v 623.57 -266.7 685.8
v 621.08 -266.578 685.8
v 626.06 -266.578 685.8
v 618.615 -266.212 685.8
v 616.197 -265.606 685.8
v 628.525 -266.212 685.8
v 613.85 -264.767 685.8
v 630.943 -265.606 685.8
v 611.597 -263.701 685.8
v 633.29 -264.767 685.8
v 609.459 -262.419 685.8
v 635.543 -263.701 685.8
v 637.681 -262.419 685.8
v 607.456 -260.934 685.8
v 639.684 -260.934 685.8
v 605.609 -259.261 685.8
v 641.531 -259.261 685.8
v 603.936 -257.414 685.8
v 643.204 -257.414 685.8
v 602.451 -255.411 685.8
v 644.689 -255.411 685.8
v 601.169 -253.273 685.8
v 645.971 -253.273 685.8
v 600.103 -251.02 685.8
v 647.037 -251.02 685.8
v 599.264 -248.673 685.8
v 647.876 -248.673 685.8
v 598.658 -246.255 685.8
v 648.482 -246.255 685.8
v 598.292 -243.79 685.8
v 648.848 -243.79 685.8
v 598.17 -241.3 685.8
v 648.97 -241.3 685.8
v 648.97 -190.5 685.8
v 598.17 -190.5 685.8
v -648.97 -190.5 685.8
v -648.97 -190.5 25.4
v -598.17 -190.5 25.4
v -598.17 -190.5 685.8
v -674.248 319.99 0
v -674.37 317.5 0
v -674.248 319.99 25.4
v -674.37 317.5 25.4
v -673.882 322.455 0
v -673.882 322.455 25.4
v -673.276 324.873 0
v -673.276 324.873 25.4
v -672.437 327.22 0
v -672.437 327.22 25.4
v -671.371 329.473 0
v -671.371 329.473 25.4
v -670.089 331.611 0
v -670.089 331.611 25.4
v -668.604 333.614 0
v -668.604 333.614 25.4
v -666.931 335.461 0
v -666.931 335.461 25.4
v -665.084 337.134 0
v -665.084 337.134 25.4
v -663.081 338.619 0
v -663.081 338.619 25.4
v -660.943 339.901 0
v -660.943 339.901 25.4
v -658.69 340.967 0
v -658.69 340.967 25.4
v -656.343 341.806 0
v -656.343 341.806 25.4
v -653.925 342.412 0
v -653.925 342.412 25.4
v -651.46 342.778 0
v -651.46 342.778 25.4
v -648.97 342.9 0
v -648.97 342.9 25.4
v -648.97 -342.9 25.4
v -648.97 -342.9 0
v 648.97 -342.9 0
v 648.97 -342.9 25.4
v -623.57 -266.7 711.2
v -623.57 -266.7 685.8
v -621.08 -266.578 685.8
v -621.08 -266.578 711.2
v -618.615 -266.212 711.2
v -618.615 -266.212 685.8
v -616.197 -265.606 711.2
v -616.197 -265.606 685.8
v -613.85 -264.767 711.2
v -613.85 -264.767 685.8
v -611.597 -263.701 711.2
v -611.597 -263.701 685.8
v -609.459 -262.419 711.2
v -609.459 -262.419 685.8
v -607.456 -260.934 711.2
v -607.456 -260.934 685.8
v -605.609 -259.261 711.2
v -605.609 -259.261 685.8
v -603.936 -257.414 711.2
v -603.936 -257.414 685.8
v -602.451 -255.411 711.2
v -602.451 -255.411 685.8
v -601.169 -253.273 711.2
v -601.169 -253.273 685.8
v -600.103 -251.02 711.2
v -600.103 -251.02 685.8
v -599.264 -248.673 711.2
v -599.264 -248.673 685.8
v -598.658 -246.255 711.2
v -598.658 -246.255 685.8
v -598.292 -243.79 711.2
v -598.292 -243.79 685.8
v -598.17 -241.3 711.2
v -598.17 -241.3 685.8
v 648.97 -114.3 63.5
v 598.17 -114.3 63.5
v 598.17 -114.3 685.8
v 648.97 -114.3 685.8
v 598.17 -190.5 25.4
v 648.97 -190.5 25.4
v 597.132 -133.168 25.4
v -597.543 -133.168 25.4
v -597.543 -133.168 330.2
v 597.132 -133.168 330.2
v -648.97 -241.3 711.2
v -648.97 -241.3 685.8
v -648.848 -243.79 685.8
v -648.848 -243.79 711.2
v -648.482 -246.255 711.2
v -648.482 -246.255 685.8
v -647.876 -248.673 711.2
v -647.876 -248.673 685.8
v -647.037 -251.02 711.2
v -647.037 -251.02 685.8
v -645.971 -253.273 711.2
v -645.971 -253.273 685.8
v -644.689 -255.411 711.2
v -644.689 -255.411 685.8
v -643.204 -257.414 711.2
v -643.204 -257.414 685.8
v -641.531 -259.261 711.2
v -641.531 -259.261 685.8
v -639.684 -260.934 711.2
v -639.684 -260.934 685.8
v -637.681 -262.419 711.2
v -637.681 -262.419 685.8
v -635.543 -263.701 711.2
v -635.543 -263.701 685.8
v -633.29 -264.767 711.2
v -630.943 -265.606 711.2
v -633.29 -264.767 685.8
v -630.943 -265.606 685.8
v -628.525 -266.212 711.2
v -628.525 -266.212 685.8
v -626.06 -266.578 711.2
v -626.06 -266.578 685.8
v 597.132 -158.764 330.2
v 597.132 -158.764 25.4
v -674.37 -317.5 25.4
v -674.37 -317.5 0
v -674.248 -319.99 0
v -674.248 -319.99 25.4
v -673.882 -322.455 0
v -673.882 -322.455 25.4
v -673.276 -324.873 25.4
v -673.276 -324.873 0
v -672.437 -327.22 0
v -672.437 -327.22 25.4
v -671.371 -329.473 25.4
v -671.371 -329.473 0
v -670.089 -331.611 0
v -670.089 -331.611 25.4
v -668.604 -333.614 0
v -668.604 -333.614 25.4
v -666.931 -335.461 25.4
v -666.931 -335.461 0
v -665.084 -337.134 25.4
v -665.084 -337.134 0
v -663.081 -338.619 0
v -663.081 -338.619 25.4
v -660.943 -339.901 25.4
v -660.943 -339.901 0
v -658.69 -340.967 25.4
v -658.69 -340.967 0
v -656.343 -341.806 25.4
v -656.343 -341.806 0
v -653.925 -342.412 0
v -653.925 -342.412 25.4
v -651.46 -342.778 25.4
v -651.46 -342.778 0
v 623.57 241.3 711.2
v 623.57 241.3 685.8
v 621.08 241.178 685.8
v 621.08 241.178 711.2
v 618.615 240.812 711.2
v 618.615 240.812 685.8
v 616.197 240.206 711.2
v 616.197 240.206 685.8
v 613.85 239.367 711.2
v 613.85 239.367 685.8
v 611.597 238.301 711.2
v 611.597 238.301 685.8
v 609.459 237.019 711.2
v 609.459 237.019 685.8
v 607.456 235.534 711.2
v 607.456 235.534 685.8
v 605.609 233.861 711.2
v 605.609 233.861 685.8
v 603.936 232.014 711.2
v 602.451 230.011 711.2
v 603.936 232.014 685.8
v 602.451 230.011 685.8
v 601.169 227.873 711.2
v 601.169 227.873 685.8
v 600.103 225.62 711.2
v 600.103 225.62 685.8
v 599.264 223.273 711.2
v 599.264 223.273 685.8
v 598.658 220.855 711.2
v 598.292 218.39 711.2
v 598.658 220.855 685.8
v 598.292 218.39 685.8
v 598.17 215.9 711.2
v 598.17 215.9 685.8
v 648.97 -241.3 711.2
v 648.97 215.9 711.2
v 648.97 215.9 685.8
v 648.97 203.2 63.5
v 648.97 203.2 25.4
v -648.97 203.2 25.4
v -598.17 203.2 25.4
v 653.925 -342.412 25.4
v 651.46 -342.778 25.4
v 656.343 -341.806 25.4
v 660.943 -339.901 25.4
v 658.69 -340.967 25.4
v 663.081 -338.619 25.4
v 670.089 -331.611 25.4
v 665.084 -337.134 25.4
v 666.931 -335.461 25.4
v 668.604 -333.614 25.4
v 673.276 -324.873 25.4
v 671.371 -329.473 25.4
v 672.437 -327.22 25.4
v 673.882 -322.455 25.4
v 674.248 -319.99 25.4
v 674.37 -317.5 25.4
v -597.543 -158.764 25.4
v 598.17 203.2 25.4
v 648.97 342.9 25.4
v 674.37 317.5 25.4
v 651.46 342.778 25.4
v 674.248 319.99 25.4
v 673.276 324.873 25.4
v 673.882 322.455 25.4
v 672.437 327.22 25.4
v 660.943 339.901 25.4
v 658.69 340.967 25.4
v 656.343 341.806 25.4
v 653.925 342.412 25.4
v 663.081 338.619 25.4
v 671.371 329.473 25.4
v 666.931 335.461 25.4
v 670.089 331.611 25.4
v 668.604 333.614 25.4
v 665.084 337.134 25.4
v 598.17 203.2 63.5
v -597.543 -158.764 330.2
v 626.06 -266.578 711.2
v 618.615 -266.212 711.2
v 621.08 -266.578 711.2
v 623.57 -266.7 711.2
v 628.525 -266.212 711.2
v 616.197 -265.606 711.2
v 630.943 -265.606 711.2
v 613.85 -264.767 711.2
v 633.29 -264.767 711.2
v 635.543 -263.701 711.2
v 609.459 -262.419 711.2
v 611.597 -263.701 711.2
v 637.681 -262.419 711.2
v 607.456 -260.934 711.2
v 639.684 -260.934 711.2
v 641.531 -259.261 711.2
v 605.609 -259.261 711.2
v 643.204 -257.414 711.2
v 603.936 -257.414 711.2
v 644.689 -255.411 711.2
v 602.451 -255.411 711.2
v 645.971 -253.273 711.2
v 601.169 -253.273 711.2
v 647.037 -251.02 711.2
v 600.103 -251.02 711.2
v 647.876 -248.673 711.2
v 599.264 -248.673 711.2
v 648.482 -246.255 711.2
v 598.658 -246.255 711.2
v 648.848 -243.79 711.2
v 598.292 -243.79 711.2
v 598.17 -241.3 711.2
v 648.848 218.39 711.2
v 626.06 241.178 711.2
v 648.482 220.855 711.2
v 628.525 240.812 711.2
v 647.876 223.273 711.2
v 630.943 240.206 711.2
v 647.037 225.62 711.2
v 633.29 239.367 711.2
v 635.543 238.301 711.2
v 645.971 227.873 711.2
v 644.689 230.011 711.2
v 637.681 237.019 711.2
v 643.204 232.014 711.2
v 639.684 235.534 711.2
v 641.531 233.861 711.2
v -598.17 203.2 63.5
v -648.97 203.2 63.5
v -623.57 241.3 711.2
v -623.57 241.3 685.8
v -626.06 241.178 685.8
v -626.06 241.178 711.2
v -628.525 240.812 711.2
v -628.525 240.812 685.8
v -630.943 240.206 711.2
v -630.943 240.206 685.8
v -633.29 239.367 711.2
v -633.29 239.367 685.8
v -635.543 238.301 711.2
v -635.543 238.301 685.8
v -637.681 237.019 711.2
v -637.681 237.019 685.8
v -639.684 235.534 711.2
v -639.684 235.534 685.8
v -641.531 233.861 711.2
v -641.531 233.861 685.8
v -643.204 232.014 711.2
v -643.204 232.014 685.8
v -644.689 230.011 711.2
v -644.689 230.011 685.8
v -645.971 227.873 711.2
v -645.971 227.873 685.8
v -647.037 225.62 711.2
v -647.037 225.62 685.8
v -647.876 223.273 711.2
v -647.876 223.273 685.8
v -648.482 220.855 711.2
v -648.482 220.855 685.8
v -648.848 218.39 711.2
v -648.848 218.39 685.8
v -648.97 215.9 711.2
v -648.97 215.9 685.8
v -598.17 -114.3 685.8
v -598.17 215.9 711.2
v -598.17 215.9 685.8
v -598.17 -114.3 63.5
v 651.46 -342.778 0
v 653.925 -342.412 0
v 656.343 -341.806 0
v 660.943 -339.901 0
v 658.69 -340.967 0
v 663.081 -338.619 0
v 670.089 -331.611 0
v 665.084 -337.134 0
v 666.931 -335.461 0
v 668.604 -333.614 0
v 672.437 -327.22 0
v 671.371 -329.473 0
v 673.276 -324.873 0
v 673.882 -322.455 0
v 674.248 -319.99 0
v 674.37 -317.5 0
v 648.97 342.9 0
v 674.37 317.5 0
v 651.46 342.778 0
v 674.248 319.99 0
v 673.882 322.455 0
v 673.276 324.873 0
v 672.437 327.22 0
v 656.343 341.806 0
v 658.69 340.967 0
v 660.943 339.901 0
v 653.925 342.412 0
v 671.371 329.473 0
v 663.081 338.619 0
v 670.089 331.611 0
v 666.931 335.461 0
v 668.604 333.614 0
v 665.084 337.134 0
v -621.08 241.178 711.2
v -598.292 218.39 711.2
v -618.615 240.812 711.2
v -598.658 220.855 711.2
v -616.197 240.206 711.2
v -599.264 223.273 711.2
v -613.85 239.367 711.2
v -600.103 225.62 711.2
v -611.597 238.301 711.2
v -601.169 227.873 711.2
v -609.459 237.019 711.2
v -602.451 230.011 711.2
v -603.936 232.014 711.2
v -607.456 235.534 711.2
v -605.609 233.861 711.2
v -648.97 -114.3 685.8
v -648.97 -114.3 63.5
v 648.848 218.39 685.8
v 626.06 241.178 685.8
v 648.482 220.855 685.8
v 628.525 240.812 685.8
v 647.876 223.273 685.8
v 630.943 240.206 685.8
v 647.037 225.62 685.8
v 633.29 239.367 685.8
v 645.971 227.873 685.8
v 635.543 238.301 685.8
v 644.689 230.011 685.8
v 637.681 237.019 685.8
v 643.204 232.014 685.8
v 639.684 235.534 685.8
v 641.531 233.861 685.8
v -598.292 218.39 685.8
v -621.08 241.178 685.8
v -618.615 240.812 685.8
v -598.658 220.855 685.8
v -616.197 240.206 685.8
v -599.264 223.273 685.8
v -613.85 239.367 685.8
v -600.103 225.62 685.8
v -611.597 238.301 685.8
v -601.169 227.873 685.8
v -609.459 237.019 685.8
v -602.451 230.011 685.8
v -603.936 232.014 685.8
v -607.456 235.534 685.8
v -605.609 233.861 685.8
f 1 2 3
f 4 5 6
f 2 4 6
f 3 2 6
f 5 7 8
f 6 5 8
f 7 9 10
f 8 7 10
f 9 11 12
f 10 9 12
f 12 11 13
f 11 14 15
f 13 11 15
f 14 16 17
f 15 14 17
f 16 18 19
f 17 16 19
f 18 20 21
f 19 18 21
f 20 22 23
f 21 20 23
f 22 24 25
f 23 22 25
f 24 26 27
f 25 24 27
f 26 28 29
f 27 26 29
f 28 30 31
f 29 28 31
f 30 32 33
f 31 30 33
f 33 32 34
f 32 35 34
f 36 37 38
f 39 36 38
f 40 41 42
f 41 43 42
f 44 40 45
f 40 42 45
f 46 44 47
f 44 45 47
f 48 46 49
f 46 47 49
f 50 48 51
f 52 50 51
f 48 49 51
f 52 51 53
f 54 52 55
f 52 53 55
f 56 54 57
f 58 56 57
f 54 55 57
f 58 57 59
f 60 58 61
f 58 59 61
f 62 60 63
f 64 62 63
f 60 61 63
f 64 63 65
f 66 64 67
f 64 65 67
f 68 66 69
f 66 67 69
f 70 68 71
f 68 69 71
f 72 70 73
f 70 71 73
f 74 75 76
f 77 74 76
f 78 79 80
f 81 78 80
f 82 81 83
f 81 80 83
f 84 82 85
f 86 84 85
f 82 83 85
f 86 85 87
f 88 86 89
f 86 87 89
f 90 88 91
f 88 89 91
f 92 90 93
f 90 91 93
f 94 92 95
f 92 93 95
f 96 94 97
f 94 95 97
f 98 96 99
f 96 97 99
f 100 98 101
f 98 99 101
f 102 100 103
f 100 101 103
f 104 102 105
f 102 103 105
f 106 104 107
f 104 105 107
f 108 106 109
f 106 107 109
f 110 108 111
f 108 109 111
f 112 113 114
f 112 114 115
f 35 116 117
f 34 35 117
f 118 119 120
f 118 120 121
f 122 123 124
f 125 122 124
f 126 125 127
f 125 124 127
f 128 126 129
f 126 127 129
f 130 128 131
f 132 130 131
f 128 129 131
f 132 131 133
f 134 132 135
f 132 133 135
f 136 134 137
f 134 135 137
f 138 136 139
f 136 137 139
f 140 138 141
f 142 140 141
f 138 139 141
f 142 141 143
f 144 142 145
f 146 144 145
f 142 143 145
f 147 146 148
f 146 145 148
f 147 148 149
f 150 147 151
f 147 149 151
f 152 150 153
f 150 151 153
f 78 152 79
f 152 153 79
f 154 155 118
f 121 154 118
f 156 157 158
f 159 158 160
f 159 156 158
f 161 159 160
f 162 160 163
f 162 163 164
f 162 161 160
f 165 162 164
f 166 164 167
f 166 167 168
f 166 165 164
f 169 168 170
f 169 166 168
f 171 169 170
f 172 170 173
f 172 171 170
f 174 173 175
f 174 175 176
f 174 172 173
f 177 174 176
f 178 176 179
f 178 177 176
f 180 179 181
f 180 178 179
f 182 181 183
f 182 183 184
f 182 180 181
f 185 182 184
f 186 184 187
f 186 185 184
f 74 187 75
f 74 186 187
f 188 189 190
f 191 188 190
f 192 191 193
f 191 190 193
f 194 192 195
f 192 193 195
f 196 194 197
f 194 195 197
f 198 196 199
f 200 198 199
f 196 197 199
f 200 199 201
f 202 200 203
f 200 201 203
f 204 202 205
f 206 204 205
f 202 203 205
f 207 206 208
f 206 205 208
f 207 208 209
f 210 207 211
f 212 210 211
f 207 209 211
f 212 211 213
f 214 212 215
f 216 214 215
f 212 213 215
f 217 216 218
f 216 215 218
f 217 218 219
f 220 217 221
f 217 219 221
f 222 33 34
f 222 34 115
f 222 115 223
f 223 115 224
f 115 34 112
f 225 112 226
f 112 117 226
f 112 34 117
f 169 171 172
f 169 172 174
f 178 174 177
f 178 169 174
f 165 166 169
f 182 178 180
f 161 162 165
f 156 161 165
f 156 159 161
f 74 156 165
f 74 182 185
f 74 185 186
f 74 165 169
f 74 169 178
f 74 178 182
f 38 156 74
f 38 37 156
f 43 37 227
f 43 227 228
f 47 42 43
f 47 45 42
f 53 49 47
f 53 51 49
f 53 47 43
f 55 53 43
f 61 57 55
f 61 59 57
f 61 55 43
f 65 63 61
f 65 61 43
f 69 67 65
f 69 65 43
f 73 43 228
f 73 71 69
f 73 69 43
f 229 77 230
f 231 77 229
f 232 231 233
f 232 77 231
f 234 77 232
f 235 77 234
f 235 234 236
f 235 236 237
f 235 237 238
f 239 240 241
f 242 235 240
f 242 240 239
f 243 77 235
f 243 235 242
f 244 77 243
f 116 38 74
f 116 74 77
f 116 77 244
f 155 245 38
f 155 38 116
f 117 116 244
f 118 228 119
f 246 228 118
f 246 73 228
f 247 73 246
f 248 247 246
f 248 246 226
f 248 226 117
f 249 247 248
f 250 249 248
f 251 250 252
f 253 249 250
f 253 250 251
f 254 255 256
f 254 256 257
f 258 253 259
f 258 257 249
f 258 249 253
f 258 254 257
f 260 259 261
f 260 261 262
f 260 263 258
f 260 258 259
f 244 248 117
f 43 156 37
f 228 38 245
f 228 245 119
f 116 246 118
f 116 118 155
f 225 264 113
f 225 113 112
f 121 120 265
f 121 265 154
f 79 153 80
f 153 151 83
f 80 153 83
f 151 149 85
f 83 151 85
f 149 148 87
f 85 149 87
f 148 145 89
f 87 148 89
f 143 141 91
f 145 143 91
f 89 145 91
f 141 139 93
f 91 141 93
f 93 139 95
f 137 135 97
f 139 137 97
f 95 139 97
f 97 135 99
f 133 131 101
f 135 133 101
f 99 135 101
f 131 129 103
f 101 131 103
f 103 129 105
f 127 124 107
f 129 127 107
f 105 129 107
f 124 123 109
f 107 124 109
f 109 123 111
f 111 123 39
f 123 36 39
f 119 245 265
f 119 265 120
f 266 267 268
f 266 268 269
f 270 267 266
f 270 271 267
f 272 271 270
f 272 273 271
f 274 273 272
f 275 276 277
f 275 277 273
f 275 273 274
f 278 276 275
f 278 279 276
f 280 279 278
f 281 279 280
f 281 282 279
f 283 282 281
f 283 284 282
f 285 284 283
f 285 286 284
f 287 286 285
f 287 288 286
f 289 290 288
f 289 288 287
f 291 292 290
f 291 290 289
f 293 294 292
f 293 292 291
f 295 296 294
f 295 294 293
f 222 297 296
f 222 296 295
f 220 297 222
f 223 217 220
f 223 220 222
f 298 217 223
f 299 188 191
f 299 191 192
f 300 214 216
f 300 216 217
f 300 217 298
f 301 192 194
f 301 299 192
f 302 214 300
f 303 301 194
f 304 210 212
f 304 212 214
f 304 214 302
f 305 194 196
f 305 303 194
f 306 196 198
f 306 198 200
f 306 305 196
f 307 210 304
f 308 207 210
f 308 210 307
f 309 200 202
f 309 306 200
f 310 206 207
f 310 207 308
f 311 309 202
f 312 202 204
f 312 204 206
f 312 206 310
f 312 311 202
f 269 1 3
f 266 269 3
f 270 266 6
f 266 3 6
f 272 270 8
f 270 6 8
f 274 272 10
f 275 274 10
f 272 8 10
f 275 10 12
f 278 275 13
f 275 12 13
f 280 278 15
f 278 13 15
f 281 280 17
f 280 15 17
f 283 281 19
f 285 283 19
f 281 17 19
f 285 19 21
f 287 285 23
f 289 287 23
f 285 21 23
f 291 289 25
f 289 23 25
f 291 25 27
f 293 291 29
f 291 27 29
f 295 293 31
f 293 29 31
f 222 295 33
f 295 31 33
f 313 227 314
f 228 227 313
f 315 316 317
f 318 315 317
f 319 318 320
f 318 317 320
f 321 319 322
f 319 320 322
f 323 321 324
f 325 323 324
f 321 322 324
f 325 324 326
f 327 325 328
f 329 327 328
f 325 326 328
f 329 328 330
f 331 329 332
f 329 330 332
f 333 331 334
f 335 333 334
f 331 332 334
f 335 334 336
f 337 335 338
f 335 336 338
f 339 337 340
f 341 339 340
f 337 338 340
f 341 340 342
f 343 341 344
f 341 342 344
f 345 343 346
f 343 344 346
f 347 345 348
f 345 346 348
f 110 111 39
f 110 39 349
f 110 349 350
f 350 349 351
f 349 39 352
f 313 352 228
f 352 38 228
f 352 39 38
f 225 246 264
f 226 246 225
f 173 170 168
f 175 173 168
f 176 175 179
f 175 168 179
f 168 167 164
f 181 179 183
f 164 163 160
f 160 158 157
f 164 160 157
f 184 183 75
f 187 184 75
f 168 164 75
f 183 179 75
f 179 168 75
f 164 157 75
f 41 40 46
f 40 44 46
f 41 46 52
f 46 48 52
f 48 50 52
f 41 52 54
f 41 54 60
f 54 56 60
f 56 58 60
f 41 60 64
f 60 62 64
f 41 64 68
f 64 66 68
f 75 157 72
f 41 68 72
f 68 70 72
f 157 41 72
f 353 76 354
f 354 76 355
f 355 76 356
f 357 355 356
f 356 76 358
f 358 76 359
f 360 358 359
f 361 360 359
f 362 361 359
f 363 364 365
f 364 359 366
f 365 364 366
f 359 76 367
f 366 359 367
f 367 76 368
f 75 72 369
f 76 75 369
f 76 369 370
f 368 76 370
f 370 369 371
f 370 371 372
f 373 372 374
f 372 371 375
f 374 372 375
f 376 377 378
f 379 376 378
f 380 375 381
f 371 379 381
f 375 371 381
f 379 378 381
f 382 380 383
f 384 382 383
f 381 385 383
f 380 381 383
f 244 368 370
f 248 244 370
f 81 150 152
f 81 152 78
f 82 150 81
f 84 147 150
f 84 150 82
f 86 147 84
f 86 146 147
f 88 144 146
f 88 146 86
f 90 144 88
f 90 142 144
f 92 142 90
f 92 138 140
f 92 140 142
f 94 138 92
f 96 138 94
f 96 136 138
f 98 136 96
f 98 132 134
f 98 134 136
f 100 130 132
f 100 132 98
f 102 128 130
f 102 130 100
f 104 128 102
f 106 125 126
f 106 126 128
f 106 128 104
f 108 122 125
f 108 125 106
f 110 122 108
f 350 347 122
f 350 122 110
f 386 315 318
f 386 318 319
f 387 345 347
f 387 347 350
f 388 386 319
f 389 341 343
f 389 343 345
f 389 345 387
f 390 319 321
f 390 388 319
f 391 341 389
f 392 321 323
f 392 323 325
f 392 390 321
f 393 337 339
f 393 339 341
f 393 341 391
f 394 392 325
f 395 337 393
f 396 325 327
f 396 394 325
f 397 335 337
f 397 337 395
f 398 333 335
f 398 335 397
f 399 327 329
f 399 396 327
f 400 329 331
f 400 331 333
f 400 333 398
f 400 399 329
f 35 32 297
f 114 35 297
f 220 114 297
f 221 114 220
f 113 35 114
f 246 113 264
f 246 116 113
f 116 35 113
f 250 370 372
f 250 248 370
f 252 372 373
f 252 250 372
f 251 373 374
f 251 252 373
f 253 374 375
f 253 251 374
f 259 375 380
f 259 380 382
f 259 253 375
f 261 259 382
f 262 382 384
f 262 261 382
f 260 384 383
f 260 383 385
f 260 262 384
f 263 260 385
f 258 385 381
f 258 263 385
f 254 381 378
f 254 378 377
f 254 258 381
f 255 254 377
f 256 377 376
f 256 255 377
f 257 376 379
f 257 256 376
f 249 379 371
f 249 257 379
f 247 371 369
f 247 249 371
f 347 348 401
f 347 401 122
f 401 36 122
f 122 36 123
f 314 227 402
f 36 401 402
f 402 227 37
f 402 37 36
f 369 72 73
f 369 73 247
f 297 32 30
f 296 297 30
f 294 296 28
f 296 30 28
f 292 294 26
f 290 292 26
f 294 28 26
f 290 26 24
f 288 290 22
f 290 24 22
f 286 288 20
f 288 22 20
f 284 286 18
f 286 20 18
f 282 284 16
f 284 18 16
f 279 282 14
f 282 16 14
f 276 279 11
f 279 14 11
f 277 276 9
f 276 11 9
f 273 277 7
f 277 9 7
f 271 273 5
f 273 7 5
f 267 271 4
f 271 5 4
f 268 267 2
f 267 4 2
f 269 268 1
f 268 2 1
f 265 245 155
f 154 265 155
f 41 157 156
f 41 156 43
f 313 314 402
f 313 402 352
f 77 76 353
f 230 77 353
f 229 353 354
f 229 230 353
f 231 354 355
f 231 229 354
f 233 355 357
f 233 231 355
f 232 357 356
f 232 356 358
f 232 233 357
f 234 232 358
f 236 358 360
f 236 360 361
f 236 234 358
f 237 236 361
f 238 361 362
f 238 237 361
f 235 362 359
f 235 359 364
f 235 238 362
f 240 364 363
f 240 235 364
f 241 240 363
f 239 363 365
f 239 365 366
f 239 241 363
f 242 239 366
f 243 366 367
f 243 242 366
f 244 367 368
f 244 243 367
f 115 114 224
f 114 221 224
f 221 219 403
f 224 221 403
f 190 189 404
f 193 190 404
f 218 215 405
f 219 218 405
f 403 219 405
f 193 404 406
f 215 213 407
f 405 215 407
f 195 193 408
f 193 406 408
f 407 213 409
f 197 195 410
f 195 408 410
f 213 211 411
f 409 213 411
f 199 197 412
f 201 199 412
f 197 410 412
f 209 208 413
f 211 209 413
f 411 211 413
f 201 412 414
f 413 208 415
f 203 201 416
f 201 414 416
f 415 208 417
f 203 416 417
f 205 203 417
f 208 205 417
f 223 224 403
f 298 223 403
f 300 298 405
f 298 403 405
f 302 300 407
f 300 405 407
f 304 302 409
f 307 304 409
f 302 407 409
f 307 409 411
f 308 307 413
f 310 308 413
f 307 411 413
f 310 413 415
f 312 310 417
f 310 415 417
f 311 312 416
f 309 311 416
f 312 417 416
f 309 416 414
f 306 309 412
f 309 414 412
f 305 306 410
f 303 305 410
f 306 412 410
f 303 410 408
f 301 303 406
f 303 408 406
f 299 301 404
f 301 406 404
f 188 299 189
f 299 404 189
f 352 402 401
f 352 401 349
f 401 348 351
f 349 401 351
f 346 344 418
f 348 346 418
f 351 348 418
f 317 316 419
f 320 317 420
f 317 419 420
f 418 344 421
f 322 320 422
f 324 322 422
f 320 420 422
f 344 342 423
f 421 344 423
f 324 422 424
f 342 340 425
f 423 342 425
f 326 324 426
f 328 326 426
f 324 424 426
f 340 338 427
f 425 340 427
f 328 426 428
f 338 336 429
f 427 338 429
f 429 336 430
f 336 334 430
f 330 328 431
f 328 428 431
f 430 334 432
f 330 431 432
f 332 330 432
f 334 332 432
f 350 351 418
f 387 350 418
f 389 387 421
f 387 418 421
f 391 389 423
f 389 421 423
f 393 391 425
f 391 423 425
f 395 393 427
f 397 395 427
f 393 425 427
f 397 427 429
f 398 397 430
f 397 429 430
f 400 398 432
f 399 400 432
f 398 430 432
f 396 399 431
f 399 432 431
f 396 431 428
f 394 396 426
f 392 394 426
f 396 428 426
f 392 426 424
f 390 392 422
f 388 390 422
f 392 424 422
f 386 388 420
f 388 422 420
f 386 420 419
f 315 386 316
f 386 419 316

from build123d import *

# Parameters (mm, degrees)
F0_W      = 1348.74
F0_H      = 685.8
F1_DEPTH  = 25.4
F3_W      = 50.8
F3_H      = 317.5
F4_DEPTH  = 38.1
F5_W      = 50.8
F5_H      = 76.2
F6_DEPTH  = 660.4
F8_DEPTH  = 25.4
F9_W      = 1194.675028
F9_H      = 25.596991
F10_DEPTH = 304.8
F11_R     = 25.4
F12_R     = 25.4
F13_R     = 25.4
F14_R     = 25.4


with BuildPart() as f1:
    # F0 (on Top) → F1 (new body)
    with BuildSketch(Plane.XY):
        Rectangle(F0_W, F0_H)
    extrude(amount=F1_DEPTH)

    # F3 (on face) → F4 (join)
    with BuildSketch(Plane.XY.offset(25.4)):
        with Locations((-623.57, 44.45)):
            Rectangle(F3_W, F3_H)
        with Locations((623.57, 44.45)):
            Rectangle(F3_W, F3_H)
    extrude(amount=F4_DEPTH)

    # F5 (on face) → F6 (join)
    with BuildSketch(Plane.XY.offset(25.4)):
        with Locations((-623.57, -152.4)):
            Rectangle(F5_W, F5_H)
        with Locations((623.57, -152.4)):
            Rectangle(F5_W, F5_H)
    extrude(amount=F6_DEPTH)

    # F7 (on face) → F8 (join)
    with BuildSketch(Plane.XY.offset(685.8)):
        with BuildLine():
            ThreePointArc((-623.57, 241.3), (-641.530512, 233.860512), (-648.97, 215.9))
            Line((-648.97, 215.9), (-648.97, -241.3))
            ThreePointArc((-648.97, -241.3), (-641.530512, -259.260512), (-623.57, -266.7))
            ThreePointArc((-623.57, -266.7), (-605.609488, -259.260512), (-598.17, -241.3))
            Line((-598.17, -241.3), (-598.17, 215.9))
            ThreePointArc((-598.17, 215.9), (-605.609488, 233.860512), (-623.57, 241.3))
        make_face()
        with BuildLine():
            Line((648.97, -241.3), (648.97, 215.9))
            ThreePointArc((648.97, 215.9), (641.530512, 233.860512), (623.57, 241.3))
            ThreePointArc((623.57, 241.3), (605.609488, 233.860512), (598.17, 215.9))
            Line((598.17, 215.9), (598.17, -241.3))
            ThreePointArc((598.17, -241.3), (605.609488, -259.260512), (623.57, -266.7))
            ThreePointArc((623.57, -266.7), (641.530512, -259.260512), (648.97, -241.3))
        make_face()
    extrude(amount=F8_DEPTH)

    # F9 (on face) → F10 (join)
    with BuildSketch(Plane.XY.offset(25.4)):
        with Locations((-0.20507, -145.966001)):
            Rectangle(F9_W, F9_H)
    extrude(amount=F10_DEPTH)

    # F11
    f11_edges = [f1.edges().sort_by_distance(p)[0] for p in [
        (-674.37, 342.9, 12.7),
    ]]
    fillet(f11_edges, radius=F11_R)

    # F12
    f12_edges = [f1.edges().sort_by_distance(p)[0] for p in [
        (-674.37, -342.9, 12.7),
    ]]
    fillet(f12_edges, radius=F12_R)

    # F13
    f13_edges = [f1.edges().sort_by_distance(p)[0] for p in [
        (674.37, -342.9, 12.7),
    ]]
    fillet(f13_edges, radius=F13_R)

    # F14
    f14_edges = [f1.edges().sort_by_distance(p)[0] for p in [
        (674.37, 342.9, 12.7),
    ]]
    fillet(f14_edges, radius=F14_R)


solid = f1.part
